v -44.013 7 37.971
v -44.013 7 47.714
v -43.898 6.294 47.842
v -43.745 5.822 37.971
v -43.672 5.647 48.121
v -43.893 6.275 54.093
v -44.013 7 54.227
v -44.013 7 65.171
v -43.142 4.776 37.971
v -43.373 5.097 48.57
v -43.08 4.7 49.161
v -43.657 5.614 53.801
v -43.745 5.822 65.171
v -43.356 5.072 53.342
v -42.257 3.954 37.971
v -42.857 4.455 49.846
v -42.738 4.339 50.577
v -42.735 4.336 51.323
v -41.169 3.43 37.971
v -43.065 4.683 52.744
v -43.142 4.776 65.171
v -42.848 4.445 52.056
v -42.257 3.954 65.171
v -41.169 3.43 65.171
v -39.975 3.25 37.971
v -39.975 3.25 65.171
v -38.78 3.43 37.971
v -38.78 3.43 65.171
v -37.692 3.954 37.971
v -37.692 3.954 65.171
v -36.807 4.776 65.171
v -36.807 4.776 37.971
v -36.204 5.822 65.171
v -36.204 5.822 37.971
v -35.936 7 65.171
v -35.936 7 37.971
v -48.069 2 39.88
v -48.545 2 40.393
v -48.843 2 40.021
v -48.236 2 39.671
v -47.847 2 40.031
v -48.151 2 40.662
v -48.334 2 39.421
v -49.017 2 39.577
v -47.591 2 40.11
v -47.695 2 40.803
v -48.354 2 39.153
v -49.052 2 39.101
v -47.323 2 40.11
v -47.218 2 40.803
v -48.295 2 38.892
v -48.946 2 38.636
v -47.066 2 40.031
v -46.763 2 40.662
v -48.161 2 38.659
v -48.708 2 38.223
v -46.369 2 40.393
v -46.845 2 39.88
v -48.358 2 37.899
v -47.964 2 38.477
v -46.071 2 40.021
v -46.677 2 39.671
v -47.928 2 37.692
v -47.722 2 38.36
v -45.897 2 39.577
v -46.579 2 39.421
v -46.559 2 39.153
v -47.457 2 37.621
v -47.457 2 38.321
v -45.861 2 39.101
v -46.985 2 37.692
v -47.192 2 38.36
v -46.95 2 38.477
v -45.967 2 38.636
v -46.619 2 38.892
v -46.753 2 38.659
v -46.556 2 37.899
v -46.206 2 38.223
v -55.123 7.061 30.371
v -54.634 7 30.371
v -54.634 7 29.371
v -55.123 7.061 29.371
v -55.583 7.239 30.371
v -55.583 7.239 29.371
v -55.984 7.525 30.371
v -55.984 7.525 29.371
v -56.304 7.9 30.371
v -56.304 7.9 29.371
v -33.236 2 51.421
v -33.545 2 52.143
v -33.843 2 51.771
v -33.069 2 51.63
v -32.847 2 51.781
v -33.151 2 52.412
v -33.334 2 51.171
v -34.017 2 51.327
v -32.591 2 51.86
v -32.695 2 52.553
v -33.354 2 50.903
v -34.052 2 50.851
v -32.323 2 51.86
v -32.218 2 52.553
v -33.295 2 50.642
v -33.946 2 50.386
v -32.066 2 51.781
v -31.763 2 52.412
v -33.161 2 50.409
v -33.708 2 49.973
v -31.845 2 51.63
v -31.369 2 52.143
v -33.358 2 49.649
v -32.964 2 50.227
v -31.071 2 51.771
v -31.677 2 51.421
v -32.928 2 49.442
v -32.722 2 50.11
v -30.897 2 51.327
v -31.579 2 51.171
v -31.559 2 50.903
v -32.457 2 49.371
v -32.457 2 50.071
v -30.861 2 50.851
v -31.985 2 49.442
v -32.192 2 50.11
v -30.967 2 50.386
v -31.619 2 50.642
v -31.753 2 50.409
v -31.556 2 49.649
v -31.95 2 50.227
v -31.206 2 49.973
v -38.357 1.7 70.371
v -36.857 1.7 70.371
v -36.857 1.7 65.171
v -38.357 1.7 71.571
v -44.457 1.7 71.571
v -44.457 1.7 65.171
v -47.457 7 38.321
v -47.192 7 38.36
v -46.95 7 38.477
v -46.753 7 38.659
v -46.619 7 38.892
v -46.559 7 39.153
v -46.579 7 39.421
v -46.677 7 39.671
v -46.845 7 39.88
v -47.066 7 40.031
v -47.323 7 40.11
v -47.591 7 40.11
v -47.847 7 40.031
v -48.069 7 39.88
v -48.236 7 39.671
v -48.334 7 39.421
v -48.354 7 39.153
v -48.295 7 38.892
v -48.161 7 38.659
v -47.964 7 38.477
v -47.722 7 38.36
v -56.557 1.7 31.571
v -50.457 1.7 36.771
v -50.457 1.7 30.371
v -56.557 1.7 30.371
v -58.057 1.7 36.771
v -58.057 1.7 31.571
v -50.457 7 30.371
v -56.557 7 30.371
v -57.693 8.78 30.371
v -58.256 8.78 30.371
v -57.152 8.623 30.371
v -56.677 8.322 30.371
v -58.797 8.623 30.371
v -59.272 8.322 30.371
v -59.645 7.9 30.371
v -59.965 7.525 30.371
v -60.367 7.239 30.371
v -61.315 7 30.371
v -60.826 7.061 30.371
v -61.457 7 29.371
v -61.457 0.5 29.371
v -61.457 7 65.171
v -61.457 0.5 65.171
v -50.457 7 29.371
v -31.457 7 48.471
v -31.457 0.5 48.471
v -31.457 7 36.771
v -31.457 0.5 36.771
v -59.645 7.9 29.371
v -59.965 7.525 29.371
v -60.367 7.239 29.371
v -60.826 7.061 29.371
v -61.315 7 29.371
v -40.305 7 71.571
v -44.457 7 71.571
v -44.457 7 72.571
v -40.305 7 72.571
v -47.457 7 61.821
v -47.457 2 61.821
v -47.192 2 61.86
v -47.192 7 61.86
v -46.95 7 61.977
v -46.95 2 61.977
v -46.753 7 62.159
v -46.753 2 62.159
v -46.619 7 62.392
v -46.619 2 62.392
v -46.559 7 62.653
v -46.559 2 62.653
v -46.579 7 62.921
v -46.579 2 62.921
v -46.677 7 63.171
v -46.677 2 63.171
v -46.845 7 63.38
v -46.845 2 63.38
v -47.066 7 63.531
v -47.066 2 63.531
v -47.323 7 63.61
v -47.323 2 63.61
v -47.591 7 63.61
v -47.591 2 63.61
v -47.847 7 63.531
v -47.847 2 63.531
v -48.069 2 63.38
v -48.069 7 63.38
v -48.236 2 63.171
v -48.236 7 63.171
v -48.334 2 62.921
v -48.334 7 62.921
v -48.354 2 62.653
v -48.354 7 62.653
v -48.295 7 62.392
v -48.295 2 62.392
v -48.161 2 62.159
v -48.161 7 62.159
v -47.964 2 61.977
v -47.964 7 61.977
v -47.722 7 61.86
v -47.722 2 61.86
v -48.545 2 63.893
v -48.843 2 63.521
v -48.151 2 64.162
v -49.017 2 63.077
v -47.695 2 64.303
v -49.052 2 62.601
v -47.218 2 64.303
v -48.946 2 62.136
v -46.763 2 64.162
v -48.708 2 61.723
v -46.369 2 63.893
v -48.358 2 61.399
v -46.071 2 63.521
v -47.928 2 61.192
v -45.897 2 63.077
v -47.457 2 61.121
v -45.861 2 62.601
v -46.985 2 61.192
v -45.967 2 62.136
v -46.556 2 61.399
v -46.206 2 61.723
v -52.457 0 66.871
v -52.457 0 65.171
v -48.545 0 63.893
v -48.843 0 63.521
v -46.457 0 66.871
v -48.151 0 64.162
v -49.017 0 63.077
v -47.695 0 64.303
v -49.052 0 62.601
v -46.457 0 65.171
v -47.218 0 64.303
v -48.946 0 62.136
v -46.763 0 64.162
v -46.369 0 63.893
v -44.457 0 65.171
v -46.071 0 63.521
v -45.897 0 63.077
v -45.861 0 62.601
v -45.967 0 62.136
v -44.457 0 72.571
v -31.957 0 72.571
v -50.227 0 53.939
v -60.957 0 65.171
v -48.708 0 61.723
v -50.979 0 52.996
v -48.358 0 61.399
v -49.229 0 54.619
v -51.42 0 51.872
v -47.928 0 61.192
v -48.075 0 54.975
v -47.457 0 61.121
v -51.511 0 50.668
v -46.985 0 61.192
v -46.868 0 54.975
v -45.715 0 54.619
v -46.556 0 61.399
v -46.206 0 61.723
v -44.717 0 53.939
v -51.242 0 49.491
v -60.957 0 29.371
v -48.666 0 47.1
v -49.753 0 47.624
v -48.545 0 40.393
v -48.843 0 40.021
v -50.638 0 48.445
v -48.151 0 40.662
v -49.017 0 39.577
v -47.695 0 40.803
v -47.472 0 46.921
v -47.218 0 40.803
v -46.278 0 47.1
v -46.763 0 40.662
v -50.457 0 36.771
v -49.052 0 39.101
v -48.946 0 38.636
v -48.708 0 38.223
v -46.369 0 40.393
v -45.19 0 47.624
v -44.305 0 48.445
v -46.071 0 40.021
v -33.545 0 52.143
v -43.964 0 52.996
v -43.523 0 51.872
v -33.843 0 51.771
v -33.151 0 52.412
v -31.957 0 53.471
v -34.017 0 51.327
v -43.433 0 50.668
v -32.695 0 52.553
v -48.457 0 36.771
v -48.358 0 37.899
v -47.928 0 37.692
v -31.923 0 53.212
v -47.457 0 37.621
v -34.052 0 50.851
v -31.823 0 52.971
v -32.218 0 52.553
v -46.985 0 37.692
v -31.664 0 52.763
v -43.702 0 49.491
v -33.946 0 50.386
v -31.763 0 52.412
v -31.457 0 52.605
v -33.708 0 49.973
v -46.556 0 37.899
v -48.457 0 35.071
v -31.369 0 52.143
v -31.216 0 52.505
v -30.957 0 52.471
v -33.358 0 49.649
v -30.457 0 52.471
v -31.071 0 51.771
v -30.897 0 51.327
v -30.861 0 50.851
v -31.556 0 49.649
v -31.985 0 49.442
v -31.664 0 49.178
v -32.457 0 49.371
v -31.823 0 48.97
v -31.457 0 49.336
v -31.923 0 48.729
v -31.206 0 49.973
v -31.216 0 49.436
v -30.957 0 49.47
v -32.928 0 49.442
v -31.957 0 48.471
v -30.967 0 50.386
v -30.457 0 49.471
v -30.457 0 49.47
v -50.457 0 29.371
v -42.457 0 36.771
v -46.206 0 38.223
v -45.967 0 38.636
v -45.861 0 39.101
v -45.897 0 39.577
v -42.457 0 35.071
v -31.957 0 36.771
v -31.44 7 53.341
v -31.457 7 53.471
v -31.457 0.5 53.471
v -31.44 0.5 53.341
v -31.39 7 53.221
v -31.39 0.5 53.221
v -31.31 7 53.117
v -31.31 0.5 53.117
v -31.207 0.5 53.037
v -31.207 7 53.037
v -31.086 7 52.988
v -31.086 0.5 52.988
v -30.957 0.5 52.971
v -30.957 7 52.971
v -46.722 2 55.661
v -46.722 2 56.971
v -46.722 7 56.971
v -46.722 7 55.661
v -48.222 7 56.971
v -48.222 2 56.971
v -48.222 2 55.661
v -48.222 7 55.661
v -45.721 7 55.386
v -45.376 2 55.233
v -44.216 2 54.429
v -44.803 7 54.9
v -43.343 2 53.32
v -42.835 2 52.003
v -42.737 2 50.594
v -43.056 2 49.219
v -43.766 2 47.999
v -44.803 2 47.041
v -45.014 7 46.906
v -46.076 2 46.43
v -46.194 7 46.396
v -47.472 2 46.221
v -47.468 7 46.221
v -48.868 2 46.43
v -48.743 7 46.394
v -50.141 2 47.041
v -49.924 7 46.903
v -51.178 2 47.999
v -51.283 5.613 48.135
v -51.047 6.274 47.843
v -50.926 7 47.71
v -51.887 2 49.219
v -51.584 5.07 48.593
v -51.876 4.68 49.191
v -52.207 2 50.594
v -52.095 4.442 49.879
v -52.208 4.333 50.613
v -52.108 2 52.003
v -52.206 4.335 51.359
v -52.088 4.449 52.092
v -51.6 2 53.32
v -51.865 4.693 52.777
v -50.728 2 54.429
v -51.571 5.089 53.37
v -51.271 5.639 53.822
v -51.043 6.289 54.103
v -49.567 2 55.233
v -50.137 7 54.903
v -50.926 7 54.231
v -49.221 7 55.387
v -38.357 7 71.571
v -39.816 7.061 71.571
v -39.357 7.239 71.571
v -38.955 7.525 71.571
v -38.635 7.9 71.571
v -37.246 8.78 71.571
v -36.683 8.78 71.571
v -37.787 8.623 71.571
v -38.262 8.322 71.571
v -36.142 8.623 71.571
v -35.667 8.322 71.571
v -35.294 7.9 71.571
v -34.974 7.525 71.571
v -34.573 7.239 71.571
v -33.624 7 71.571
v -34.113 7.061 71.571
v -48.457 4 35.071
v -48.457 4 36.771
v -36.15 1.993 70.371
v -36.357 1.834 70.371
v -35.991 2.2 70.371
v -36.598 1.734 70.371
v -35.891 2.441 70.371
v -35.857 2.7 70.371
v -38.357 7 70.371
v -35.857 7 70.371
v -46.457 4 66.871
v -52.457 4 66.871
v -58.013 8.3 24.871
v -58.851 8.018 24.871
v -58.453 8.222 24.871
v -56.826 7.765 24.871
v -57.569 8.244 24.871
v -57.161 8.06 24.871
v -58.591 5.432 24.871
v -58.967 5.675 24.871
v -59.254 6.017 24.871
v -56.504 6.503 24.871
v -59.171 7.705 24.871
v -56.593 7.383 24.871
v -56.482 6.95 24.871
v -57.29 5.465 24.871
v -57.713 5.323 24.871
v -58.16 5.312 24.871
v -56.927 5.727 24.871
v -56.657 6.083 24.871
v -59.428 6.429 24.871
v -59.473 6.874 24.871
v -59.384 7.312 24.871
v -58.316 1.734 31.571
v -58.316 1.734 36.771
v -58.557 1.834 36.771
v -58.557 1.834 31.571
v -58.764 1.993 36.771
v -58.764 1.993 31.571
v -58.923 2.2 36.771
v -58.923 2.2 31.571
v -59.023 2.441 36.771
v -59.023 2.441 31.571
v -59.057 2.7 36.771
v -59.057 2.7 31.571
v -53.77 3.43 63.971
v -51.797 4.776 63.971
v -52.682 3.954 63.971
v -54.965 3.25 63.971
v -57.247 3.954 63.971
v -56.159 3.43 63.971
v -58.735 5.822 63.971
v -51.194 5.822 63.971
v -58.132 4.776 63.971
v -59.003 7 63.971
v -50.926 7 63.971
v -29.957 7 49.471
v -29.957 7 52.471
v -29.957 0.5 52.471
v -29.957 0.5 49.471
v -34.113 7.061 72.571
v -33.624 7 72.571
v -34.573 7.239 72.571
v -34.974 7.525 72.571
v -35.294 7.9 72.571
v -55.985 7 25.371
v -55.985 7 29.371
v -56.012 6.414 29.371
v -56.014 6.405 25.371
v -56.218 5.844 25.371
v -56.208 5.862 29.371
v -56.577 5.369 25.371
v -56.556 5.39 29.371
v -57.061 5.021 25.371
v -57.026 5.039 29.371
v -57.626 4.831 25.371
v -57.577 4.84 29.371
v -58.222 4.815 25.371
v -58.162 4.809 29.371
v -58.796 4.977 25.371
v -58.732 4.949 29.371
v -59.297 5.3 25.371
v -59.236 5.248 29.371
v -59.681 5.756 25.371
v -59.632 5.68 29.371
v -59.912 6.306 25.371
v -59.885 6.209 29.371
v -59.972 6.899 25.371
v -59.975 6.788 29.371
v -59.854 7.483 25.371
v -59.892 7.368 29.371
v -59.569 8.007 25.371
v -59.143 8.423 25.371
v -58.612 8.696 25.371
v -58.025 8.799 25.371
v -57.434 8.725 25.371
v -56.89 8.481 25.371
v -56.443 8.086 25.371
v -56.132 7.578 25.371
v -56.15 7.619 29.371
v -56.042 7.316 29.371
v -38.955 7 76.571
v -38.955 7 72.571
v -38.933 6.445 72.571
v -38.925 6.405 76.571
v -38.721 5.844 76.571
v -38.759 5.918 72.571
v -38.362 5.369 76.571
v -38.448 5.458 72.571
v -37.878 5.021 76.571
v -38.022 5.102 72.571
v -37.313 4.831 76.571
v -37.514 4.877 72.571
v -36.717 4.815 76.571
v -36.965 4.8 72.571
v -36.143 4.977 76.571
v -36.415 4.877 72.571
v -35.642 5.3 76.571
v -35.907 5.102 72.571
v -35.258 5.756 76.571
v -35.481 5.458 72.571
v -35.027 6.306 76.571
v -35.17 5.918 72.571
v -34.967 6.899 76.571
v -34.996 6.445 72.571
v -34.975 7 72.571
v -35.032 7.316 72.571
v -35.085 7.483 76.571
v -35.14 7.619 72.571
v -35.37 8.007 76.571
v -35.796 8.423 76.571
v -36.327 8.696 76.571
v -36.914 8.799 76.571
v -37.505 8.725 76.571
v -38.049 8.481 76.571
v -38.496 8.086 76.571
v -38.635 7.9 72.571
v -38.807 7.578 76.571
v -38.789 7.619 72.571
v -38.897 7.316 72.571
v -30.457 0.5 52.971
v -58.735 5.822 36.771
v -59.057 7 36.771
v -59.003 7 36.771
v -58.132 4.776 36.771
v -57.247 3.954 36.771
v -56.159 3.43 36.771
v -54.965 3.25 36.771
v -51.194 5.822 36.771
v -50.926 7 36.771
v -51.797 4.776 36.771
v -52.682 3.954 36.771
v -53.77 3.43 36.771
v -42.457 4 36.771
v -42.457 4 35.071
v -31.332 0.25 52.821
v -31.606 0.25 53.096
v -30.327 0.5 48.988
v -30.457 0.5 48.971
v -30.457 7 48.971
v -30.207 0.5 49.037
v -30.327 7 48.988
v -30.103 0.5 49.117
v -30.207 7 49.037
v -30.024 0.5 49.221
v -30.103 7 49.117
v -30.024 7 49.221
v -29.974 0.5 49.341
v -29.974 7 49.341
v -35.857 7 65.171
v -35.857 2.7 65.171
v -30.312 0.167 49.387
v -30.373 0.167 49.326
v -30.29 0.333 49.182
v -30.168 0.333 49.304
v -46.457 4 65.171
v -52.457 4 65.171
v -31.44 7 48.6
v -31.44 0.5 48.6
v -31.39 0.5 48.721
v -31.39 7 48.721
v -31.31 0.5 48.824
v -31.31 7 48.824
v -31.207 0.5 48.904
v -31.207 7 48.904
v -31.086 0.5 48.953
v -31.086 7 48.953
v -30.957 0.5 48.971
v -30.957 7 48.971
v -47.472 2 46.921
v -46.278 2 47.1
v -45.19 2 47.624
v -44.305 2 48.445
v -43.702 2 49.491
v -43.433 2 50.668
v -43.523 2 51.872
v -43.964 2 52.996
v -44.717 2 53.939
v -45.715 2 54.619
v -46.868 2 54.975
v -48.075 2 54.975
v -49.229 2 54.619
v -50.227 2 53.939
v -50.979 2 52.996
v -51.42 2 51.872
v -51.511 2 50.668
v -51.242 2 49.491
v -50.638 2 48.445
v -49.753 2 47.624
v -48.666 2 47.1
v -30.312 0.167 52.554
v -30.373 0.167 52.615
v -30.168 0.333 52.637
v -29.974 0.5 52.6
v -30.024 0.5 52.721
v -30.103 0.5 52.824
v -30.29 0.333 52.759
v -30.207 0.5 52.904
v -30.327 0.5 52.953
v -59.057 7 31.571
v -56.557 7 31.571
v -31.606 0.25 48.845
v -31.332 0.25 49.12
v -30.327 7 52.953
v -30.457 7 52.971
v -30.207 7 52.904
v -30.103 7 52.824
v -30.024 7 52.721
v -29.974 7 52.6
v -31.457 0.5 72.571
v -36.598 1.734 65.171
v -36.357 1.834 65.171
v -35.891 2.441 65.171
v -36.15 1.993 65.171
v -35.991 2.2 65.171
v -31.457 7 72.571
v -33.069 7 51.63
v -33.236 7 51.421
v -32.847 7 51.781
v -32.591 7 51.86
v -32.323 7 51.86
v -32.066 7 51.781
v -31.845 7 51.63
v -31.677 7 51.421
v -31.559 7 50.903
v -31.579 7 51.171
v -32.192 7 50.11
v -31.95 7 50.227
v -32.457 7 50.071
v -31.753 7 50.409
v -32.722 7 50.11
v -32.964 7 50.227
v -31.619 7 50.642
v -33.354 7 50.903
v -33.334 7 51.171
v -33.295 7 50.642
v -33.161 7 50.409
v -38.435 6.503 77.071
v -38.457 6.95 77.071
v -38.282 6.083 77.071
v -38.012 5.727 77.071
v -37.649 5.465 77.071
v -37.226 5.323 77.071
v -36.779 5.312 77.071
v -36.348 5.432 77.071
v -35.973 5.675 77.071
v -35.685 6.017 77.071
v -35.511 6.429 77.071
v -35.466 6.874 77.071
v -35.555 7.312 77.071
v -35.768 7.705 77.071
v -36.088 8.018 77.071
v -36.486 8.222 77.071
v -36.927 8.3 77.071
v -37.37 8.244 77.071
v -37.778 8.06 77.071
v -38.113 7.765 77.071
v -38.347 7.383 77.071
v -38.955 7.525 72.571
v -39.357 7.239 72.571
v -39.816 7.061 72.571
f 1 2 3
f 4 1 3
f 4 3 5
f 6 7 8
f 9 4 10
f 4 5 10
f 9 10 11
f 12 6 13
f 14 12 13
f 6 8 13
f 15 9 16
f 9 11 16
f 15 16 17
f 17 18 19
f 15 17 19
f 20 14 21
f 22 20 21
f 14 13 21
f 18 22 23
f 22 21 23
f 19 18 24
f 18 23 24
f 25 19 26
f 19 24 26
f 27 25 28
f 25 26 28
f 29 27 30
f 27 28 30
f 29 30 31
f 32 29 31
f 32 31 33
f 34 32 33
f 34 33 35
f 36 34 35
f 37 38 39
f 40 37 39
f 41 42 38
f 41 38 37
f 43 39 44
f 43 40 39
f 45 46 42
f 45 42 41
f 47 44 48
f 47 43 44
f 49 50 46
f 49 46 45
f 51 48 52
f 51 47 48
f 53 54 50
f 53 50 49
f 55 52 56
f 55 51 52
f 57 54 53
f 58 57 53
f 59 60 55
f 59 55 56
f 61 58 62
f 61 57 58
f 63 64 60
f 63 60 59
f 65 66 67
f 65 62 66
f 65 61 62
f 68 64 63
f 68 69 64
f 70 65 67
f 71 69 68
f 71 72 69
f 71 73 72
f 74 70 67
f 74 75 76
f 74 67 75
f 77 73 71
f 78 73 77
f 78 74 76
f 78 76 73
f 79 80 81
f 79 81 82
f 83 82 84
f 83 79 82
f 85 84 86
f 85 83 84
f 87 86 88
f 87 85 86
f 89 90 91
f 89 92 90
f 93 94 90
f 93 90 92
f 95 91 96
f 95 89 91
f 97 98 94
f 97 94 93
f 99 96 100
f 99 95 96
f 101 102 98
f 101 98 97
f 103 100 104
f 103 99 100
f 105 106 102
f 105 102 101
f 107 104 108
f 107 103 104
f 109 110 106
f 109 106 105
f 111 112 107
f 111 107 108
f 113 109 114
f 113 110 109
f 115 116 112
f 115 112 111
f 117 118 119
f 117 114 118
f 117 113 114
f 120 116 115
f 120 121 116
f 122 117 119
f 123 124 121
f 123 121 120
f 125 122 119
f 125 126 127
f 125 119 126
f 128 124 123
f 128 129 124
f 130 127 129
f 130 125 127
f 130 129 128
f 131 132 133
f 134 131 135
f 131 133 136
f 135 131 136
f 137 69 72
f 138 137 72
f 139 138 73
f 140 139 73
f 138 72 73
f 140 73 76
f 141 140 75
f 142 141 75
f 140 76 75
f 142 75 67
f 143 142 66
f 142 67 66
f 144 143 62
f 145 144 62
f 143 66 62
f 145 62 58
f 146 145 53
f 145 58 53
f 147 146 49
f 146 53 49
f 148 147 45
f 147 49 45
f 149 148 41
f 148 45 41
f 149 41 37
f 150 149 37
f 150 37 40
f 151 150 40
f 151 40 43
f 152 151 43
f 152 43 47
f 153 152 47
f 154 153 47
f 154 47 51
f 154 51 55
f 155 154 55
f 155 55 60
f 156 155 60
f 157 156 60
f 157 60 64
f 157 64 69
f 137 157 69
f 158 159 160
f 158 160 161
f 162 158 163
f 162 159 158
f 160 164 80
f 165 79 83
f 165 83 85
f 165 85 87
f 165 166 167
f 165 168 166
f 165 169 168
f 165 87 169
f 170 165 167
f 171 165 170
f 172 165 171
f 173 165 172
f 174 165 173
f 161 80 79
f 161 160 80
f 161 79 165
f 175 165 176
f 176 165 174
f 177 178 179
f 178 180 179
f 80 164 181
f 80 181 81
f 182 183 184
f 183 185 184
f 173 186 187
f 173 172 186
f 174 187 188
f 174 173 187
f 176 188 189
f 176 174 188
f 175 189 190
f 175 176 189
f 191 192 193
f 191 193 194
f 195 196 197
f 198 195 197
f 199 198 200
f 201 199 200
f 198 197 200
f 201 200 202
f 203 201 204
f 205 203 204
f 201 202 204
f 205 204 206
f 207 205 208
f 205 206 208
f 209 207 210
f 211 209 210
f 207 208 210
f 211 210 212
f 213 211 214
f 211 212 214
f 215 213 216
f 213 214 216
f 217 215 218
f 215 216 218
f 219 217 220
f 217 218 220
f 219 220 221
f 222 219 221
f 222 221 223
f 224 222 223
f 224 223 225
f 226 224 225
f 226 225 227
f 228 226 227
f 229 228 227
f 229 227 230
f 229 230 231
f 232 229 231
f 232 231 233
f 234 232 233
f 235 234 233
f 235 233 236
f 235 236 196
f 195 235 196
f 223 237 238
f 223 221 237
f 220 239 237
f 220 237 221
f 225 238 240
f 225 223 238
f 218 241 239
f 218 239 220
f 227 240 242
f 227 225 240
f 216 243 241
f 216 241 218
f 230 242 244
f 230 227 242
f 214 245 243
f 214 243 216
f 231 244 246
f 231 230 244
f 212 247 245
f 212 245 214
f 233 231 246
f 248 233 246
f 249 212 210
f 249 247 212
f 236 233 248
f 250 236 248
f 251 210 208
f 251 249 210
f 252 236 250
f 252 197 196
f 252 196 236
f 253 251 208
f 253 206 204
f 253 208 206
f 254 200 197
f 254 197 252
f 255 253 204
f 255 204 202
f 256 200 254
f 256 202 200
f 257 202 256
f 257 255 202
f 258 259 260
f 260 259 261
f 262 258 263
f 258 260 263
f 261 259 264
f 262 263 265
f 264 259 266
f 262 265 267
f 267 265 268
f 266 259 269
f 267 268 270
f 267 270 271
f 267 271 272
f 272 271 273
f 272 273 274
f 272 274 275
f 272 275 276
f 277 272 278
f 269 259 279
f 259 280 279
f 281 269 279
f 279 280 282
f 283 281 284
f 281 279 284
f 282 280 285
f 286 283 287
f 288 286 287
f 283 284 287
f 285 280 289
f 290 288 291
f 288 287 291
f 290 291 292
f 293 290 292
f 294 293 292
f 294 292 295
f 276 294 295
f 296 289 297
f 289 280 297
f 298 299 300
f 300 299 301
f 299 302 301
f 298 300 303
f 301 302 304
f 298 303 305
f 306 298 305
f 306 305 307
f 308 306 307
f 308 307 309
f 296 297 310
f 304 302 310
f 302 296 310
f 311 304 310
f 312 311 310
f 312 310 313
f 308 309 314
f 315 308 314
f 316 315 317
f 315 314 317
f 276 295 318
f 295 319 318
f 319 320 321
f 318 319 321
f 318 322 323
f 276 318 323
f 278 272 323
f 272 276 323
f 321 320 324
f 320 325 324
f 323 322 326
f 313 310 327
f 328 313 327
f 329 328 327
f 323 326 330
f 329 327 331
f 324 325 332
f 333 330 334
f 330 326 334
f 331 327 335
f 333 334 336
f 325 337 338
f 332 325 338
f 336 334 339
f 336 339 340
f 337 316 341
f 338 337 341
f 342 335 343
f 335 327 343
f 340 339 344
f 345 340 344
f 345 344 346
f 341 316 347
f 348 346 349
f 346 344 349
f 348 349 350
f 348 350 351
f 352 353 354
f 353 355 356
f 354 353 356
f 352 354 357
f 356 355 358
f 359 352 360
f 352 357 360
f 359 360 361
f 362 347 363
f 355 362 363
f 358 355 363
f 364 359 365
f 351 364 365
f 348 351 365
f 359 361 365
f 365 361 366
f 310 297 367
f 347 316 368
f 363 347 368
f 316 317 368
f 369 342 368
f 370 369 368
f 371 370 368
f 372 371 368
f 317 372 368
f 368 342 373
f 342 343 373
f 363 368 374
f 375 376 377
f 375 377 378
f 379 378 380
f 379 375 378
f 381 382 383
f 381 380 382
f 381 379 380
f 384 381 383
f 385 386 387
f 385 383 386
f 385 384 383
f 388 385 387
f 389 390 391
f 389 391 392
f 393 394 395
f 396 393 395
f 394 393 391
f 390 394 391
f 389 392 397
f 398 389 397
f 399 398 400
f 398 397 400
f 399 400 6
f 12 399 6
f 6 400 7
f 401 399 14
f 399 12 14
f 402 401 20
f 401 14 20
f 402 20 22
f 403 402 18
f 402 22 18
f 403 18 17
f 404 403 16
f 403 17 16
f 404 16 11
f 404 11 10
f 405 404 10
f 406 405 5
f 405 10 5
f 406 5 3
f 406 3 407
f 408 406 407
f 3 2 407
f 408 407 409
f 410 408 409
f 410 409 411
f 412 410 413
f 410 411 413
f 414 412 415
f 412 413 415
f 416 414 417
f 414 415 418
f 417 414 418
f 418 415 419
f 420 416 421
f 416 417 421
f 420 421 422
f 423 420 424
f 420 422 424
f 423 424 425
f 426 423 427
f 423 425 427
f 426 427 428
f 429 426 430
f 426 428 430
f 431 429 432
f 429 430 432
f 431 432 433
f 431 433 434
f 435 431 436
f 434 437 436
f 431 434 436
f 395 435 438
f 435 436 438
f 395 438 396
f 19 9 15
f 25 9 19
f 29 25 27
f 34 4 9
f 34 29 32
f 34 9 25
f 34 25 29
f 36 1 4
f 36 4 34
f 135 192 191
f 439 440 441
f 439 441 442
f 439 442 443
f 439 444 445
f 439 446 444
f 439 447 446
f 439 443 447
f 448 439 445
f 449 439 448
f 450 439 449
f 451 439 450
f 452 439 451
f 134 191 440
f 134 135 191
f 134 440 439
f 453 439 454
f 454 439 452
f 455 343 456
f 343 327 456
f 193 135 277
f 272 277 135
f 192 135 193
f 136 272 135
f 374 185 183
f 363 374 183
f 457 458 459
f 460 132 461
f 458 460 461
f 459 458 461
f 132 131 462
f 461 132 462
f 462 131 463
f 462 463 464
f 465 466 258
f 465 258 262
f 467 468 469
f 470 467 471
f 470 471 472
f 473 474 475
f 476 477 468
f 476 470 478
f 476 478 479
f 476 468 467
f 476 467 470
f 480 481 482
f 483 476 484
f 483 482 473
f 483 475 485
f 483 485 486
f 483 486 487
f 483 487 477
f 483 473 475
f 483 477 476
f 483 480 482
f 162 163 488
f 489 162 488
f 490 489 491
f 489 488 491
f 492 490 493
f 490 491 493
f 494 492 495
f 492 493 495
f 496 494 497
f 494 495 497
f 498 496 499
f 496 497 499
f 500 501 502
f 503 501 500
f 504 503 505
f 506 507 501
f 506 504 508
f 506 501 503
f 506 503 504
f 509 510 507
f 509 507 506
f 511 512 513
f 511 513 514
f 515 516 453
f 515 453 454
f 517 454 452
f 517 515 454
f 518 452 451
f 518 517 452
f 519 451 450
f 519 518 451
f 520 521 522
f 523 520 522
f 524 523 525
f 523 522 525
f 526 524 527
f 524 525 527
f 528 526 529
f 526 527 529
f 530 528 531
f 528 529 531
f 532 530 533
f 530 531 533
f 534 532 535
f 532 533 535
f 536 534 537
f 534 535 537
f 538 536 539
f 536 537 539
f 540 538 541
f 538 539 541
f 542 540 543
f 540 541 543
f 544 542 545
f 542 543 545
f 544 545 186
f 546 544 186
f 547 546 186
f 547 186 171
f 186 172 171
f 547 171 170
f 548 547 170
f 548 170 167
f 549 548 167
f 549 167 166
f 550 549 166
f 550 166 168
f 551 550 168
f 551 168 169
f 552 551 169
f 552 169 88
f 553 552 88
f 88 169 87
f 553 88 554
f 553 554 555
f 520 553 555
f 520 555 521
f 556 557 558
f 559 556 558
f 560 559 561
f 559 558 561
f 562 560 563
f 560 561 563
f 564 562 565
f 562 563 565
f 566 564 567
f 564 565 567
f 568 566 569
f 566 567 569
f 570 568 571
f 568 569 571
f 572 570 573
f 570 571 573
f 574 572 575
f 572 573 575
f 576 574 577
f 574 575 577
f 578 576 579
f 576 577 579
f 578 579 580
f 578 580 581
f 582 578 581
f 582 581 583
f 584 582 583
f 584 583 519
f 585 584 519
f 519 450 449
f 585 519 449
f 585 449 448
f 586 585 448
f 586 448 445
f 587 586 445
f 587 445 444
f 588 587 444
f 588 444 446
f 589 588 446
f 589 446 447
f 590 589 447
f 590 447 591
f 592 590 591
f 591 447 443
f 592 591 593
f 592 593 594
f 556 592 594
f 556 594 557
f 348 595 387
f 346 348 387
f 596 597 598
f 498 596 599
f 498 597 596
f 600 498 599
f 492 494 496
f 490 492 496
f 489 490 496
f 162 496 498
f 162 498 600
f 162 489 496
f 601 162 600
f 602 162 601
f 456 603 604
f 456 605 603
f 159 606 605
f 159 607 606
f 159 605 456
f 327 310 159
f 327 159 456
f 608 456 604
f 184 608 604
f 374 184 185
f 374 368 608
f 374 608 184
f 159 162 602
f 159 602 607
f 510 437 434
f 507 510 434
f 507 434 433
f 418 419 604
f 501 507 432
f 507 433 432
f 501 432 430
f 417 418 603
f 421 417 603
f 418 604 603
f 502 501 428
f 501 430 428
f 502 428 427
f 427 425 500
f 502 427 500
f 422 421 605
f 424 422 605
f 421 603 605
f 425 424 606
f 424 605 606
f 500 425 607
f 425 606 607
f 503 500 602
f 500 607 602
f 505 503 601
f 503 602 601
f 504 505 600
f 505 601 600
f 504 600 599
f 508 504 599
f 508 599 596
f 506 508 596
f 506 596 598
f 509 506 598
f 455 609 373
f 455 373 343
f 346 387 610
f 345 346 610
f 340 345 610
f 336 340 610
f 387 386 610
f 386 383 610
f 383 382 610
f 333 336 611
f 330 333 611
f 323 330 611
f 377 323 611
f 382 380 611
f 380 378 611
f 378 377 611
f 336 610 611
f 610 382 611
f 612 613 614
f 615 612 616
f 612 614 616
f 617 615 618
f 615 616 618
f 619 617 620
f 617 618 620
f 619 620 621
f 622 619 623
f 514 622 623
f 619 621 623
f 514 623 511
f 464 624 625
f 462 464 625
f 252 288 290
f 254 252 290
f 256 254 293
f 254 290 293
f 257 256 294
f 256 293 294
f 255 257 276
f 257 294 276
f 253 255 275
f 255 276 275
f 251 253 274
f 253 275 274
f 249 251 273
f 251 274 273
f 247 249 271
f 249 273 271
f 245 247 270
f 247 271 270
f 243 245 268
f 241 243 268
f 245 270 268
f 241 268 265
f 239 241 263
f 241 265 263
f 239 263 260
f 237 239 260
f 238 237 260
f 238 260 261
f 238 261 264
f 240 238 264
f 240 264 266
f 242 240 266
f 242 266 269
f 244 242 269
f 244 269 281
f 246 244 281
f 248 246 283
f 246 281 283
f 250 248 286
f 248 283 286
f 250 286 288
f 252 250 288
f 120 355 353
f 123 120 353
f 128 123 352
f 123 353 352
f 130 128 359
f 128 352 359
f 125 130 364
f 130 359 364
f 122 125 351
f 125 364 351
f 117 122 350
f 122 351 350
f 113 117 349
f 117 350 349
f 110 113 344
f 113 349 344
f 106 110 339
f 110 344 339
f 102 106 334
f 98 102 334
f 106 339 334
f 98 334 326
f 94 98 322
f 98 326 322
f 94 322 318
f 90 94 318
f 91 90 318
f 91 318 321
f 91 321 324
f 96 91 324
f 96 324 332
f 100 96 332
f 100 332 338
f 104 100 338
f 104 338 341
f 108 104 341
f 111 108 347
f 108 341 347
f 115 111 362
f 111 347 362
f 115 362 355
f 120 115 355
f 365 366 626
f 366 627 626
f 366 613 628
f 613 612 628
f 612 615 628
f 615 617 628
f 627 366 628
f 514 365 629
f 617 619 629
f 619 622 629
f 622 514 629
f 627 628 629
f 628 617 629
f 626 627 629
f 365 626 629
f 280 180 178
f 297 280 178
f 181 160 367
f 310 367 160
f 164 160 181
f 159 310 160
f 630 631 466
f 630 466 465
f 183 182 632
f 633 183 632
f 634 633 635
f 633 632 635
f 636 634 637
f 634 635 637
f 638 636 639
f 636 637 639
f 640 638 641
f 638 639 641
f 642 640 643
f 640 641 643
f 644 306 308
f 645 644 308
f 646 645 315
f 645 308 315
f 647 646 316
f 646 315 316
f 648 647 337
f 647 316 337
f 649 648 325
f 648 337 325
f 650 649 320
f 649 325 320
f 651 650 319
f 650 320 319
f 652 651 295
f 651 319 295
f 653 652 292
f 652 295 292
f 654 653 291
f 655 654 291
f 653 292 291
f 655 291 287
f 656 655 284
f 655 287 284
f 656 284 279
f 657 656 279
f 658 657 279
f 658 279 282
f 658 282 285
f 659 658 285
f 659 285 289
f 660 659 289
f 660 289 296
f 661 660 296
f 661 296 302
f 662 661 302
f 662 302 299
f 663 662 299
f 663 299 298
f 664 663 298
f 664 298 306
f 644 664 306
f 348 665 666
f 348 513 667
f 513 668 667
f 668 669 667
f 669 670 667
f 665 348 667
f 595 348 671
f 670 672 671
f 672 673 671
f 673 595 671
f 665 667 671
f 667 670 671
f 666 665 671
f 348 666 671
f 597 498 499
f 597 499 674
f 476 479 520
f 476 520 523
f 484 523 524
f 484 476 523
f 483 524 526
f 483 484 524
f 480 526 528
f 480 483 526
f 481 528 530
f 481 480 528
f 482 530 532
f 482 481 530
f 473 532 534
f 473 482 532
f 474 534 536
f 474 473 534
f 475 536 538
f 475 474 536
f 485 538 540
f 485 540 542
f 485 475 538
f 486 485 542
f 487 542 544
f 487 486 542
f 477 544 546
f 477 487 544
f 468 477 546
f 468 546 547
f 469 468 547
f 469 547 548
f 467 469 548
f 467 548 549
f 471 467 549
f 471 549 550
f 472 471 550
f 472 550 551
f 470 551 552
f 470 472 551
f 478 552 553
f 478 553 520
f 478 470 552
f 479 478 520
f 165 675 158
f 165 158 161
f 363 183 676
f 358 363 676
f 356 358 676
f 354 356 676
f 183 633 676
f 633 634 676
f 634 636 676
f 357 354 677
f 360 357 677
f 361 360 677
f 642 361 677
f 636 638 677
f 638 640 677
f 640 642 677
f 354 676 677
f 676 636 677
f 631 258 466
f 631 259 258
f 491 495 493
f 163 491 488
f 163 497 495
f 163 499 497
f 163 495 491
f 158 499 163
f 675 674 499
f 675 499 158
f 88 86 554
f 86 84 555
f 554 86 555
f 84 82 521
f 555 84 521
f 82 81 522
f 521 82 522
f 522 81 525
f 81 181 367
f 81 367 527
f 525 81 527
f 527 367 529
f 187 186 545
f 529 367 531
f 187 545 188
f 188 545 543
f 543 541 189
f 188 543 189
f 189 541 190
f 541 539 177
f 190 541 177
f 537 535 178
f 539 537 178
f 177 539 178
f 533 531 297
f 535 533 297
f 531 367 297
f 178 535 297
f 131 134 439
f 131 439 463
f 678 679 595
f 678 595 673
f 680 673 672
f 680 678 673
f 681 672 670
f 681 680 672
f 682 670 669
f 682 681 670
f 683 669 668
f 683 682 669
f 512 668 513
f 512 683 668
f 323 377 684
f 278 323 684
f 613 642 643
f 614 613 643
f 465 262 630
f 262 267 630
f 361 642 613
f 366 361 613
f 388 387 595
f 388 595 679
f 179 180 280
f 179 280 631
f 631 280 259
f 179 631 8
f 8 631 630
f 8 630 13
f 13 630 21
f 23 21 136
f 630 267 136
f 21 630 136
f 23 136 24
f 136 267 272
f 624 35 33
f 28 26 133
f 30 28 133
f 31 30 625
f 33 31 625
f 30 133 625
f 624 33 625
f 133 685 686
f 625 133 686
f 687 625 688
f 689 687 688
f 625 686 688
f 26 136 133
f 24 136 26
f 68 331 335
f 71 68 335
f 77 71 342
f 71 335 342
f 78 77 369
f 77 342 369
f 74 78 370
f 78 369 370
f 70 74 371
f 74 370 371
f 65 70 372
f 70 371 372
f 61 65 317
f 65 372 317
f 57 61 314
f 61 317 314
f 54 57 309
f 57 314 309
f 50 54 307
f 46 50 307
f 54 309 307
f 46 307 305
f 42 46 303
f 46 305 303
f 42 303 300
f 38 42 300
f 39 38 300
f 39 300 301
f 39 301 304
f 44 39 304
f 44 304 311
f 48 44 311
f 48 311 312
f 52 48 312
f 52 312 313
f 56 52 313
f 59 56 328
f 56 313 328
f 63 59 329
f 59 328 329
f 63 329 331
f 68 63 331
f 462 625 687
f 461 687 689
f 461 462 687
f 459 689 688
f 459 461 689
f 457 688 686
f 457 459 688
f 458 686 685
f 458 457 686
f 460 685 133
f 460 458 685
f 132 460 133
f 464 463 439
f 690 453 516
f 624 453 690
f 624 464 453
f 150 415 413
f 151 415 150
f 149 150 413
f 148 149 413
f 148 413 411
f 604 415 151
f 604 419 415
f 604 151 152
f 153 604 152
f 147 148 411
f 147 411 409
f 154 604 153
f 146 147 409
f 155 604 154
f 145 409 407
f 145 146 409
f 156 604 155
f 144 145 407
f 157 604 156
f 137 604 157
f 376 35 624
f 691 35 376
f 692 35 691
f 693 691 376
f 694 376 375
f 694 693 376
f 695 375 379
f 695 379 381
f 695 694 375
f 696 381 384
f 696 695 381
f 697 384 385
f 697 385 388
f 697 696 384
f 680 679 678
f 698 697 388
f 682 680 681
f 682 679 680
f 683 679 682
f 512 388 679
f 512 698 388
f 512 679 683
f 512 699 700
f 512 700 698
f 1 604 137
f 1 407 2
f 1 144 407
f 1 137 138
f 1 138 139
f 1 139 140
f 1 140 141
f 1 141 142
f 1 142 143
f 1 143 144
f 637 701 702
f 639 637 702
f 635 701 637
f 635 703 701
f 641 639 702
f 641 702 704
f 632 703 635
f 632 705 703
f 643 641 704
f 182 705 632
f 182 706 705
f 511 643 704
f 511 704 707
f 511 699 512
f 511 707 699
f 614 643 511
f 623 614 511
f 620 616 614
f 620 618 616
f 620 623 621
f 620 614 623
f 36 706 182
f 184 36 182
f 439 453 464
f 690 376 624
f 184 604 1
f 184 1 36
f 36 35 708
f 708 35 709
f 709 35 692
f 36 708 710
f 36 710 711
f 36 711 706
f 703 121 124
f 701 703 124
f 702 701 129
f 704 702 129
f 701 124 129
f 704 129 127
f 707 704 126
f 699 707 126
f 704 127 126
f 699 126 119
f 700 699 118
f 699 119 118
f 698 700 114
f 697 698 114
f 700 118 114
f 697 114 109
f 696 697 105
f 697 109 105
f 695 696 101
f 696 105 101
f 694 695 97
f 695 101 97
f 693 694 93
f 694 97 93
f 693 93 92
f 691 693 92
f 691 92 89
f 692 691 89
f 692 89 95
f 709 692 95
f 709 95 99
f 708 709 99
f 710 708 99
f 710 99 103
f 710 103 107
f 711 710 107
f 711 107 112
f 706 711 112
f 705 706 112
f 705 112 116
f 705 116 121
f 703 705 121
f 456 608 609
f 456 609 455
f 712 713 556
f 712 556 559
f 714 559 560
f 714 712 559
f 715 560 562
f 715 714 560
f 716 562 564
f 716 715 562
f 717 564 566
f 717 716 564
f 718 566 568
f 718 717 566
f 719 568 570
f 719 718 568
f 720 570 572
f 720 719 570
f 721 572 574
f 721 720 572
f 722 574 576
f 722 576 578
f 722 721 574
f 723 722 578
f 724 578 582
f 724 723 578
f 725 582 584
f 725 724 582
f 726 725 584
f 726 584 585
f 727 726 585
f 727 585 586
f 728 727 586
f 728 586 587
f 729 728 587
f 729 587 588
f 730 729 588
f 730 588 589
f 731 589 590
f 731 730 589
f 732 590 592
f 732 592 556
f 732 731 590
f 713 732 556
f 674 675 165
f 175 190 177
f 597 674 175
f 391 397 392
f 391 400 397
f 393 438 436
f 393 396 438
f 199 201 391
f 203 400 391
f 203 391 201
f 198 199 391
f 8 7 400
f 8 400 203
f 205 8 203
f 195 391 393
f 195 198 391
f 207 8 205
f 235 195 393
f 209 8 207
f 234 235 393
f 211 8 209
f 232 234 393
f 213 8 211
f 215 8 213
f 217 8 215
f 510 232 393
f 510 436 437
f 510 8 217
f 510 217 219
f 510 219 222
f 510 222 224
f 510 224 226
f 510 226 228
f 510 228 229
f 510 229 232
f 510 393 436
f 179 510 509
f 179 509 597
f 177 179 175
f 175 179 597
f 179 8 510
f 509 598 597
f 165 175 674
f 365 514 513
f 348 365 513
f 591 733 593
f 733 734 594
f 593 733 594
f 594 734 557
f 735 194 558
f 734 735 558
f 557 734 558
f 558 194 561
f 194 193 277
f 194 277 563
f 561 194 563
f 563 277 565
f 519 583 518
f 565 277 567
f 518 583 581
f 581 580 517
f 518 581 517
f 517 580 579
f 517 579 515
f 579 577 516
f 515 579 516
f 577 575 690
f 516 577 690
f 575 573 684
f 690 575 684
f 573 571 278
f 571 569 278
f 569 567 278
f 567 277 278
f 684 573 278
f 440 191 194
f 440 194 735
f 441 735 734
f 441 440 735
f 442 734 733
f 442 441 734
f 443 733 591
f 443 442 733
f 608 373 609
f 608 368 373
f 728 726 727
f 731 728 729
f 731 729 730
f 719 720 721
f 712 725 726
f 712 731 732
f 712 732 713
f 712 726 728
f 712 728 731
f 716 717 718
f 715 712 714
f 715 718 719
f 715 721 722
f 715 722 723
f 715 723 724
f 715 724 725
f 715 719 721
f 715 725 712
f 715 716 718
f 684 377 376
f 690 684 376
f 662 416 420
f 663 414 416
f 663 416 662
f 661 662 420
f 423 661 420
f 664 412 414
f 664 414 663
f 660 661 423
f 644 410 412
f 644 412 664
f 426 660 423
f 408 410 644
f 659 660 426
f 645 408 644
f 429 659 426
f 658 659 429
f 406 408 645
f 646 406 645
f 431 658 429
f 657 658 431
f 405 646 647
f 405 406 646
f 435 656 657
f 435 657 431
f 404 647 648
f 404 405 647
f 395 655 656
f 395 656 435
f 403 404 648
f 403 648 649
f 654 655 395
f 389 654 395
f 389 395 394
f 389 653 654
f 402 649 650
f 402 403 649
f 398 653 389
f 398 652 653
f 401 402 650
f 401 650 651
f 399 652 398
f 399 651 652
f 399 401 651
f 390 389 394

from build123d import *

# Parameters (mm, degrees)
SKETCH1_W            = 30
SKETCH1_H            = 30.8
BOSS_EXTRUDE1_DEPTH  = 7
SKETCH2_R            = 4.05
CUT_EXTRUDE1_DEPTH   = 6.5
SKETCH3_W            = 15
SKETCH3_H            = 1.2
SKETCH3_W_2          = 9
SKETCH3_W_3          = 11
SKETCH3_W_4          = 13
CUT_EXTRUDE2_DEPTH   = 4
SKETCH4_W            = 30
SKETCH4_H            = 3
CUT_EXTRUDE3_DEPTH   = 1.2
SKETCH5_W            = 30
SKETCH5_H            = 3
CUT_EXTRUDE4_DEPTH   = 1.2
SKETCH6_R            = 4.05
CUT_EXTRUDE5_DEPTH   = 27.2
SKETCH7_R            = 4.05
CUT_EXTRUDE6_DEPTH   = 27.2
SKETCH8_R            = 4.75
CUT_EXTRUDE7_DEPTH   = 5
BOSS_EXTRUDE2_DEPTH  = 6.4
FILLET1_R            = 1
BOSS_EXTRUDE3_DEPTH  = 6.4
FILLET2_R            = 1
SKETCH12_W           = 1.5
SKETCH12_H           = 1.344099237
CUT_EXTRUDE8_DEPTH   = 5
SKETCH13_W           = 13
SKETCH13_H           = 7
BOSS_EXTRUDE4_DEPTH  = 1
SKETCH14_W           = 11
SKETCH14_H           = 7
BOSS_EXTRUDE5_DEPTH  = 1
SKETCH15_R           = 2
BOSS_EXTRUDE8_DEPTH  = 5.5
SKETCH16_R           = 2
BOSS_EXTRUDE9_DEPTH  = 5.5
FILLET3_R            = 2
FILLET4_R            = 2
FILLET5_R            = 2
CHAMFER2_SIZE        = 0.5
CHAMFER3_SIZE        = 0.5
SKETCH17_W           = 4
SKETCH17_H           = 7
BOSS_EXTRUDE10_DEPTH = 1.5
FILLET7_R            = 0.5
SKETCH18_R           = 0.9
CUT_EXTRUDE9_DEPTH   = 99.965895754
SKETCH19_R           = 1.6
CUT_EXTRUDE10_DEPTH  = 2
SKETCH20_R           = 0.9
CUT_EXTRUDE11_DEPTH  = 99.965895754
SKETCH21_R           = 1.6
CUT_EXTRUDE12_DEPTH  = 2
CHAMFER6_SIZE        = 0.5
SKETCH22_W           = 6
SKETCH22_H           = 4
BOSS_EXTRUDE11_DEPTH = 0.5
SKETCH23_W           = 6
SKETCH23_H           = 4
BOSS_EXTRUDE12_DEPTH = 0.5
BOSS_EXTRUDE13_REACH = 100.822
SKETCH24_W           = 4.732966807
SKETCH24_H           = 1.2
SKETCH24_W_2         = 4.75835454


# Some blends are built 0.0001 mm under size
with BuildPart() as part:
    # Sketch1 → Boss-Extrude1 (new body)
    with BuildSketch(Plane(origin=(0, 0, 0), x_dir=(1, 0, 0), z_dir=(0, 1, 0))):
        with Locations((-46.45686042, -50.970505576)):
            Rectangle(SKETCH1_W, SKETCH1_H)
    extrude(amount=BOSS_EXTRUDE1_DEPTH)

    # Sketch2 → Cut-Extrude1 (cut)
    with BuildSketch(Plane.XZ):
        with Locations(Location((-47.47186042, 50.970505576, 0), (0, 0, 270))):
            Circle(SKETCH2_R)
    extrude(amount=-CUT_EXTRUDE1_DEPTH, mode=Mode.SUBTRACT)

    # Sketch3 → Cut-Extrude2 (cut)
    with BuildSketch(Plane.XZ):
        with Locations((-38.95686042, 65.770505576)):
            Rectangle(SKETCH3_W, SKETCH3_H)
        with Locations((-56.95686042, 65.770505576)):
            Rectangle(SKETCH3_W_2, SKETCH3_H)
        with Locations((-36.95686042, 36.170505576)):
            Rectangle(SKETCH3_W_3, SKETCH3_H)
        with Locations((-54.95686042, 36.170505576)):
            Rectangle(SKETCH3_W_4, SKETCH3_H)
    extrude(amount=-CUT_EXTRUDE2_DEPTH, mode=Mode.SUBTRACT)

    # Sketch4 → Cut-Extrude3 (cut)
    with BuildSketch(Plane.XY.offset(66.370505576)):
        with Locations((-46.45686042, 5.5)):
            Rectangle(SKETCH4_W, SKETCH4_H)
    extrude(amount=-CUT_EXTRUDE3_DEPTH, mode=Mode.SUBTRACT)

    # Sketch5 → Cut-Extrude4 (cut)
    with BuildSketch(Plane(origin=(0, 0, 35.570505576), x_dir=(-1, 0, 0), z_dir=(0, 0, -1))):
        with Locations((46.45686042, 5.5)):
            Rectangle(SKETCH5_W, SKETCH5_H)
    extrude(amount=-CUT_EXTRUDE4_DEPTH, mode=Mode.SUBTRACT)

    # Sketch6 → Cut-Extrude5 (cut)
    with BuildSketch(Plane.XY.offset(65.170505576)):
        with Locations((-39.974556342, 7.3)):
            Circle(SKETCH6_R)
    extrude(amount=-CUT_EXTRUDE5_DEPTH, mode=Mode.SUBTRACT)

    # Sketch7 → Cut-Extrude6 (cut)
    with BuildSketch(Plane(origin=(0, 0, 36.770505576), x_dir=(-1, 0, 0), z_dir=(0, 0, -1))):
        with Locations((54.96455223, 7.3)):
            Circle(SKETCH7_R)
    extrude(amount=-CUT_EXTRUDE6_DEPTH, mode=Mode.SUBTRACT)

    # Sketch8 → Cut-Extrude7 (cut)
    with BuildSketch(Plane(origin=(0, 7, 0), x_dir=(1, 0, 0), z_dir=(0, 1, 0))):
        with Locations(Location((-47.47186042, -50.970505576, 0), (0, 0, 270))):
            Circle(SKETCH8_R)
    extrude(amount=-CUT_EXTRUDE7_DEPTH, mode=Mode.SUBTRACT)

    # Sketch10 → Boss-Extrude2 (add)
    with BuildSketch(Plane.XY.offset(65.170505576)):
        Polygon((-31.45686042, 0), (-31.45686042, 7), (-35.85686042, 7), (-35.85686042, 1.7), (-44.45686042, 1.7), (-44.45686042, 0), align=None)
    extrude(amount=BOSS_EXTRUDE2_DEPTH)

    # Fillet1
    fillet1_edges = [part.edges().sort_by_distance(p)[0] for p in [
        (-35.85686042, 1.7, 68.370505576),
    ]]
    fillet(fillet1_edges, radius=FILLET1_R)

    # Sketch11 → Boss-Extrude3 (add)
    with BuildSketch(Plane(origin=(0, 0, 36.770505576), x_dir=(-1, 0, 0), z_dir=(0, 0, -1))):
        Polygon((61.45686042, 7), (61.45686042, 0), (50.45686042, 0), (50.45686042, 1.7), (59.05686042, 1.7), (59.05686042, 7), align=None)
    extrude(amount=BOSS_EXTRUDE3_DEPTH)

    # Fillet2
    fillet2_edges = [part.edges().sort_by_distance(p)[0] for p in [
        (-59.05686042, 1.7, 33.570505576),
    ]]
    fillet(fillet2_edges, radius=FILLET2_R)

    # Sketch12 → Cut-Extrude8 (cut)
    with BuildSketch(Plane(origin=(0, 7, 0), x_dir=(1, 0, 0), z_dir=(0, 1, 0))):
        with Locations((-47.47186042, -56.298455958)):
            Rectangle(SKETCH12_W, SKETCH12_H)
    extrude(amount=-CUT_EXTRUDE8_DEPTH, mode=Mode.SUBTRACT)

    # Sketch13 → Boss-Extrude4 (add)
    with BuildSketch(Plane.XY.offset(71.570505576)):
        with Locations((-37.95686042, 3.5)):
            Rectangle(SKETCH13_W, SKETCH13_H)
    extrude(amount=BOSS_EXTRUDE4_DEPTH)

    # Sketch14 → Boss-Extrude5 (add)
    with BuildSketch(Plane(origin=(0, 0, 30.370505576), x_dir=(-1, 0, 0), z_dir=(0, 0, -1))):
        with Locations((55.95686042, 3.5)):
            Rectangle(SKETCH14_W, SKETCH14_H)
    extrude(amount=BOSS_EXTRUDE5_DEPTH)

    # Sketch15 → Boss-Extrude8 (add)
    with BuildSketch(Plane.XY.offset(71.570505576)):
        with Locations(Location((-36.96455223, 6.8, 0), (0, 0, 174.260829523))):
            Circle(SKETCH15_R)
    extrude(amount=BOSS_EXTRUDE8_DEPTH)

    # Sketch16 → Boss-Extrude9 (add)
    with BuildSketch(Plane(origin=(0, 0, 30.370505576), x_dir=(-1, 0, 0), z_dir=(0, 0, -1))):
        with Locations(Location((57.974556342, 6.8, 0), (0, 0, 174.260829523))):
            Circle(SKETCH16_R)
    extrude(amount=BOSS_EXTRUDE9_DEPTH)

    # Fillet3
    fillet3_edges = [part.edges().sort_by_distance(p)[0] for p in [
        (-59.964531217, 7, 29.870505576),
    ]]
    fillet(fillet3_edges, radius=FILLET3_R)

    # Fillet4
    # the kernel refuses this fillet: 2 mm, written as the material it adds along each edge
    with BuildSketch(Plane(origin=(-55.984581468, 7, 30.370505576), x_dir=(1.0, 7.52728269616064e-12, 0), z_dir=(0, 0, -1))) as fillet4_piece_1:
        with BuildLine():
            CenterArc((1.350683743, -2), FILLET4_R, 90, 56.632987031)
            ThreePointArc((-0.319645565, -0.9), (-0.105311329, -0.469360383), (0, 0))
            Line((0, 0), (1.350683743, 0))
        make_face()
    extrude(amount=1)

    # Fillet5
    # the kernel refuses this fillet: 2 mm, written as the material it adds along each edge
    with BuildSketch(Plane(origin=(-38.954527104, 7, 71.570505576), x_dir=(-1.0, 7.116297137925098e-12, 0), z_dir=(0, 0, 1)), Plane(origin=(-34.974577356, 7, 72.570505576), x_dir=(1, 0, 0), z_dir=(0, 0, -1))) as fillet5_piece_1:
        with BuildLine():
            CenterArc((1.350683743, -2), FILLET5_R, 90, 56.632987031)
            ThreePointArc((-0.319645565, -0.9), (-0.105311329, -0.469360383), (0, 0))
            Line((0, 0), (1.350683743, 0))
        make_face()
    extrude(amount=1)

    # Chamfer2
    chamfer2_edges = [part.edges().sort_by_distance(p)[0] for p in [
        (-34.974577356, 6.6, 77.070505576),
    ]]
    chamfer(chamfer2_edges, length=CHAMFER2_SIZE)

    # Chamfer3
    chamfer3_edges = [part.edges().sort_by_distance(p)[0] for p in [
        (-59.964531217, 6.6, 24.870505576),
    ]]
    chamfer(chamfer3_edges, length=CHAMFER3_SIZE)

    # Sketch17 → Boss-Extrude10 (add)
    with BuildSketch(Plane(origin=(-31.45686042, 0, 0), x_dir=(0, 0, -1), z_dir=(1, 0, 0))):
        with Locations((-50.970505576, 3.5)):
            Rectangle(SKETCH17_W, SKETCH17_H)
    extrude(amount=BOSS_EXTRUDE10_DEPTH)

    # Fillet7
    fillet7_edges = [part.edges().sort_by_distance(p)[0] for p in [
        (-31.45686042, 3.5, 52.970505576),
        (-31.45686042, 3.5, 48.970505576),
        (-29.95686042, 3.5, 52.970505576),
        (-29.95686042, 3.5, 48.970505576),
    ]]
    fillet(fillet7_edges, radius=FILLET7_R)

    # Sketch18 → Cut-Extrude9 (cut, through all)
    with BuildSketch(Plane.XZ):
        with Locations(Location((-32.45686042, 50.970505576, 0), (0, 0, 270))):
            Circle(SKETCH18_R)
    extrude(amount=-CUT_EXTRUDE9_DEPTH, mode=Mode.SUBTRACT)

    # Sketch19 → Cut-Extrude10 (cut)
    with BuildSketch(Plane.XZ):
        with Locations(Location((-32.45686042, 50.970505576, 0), (0, 0, 270))):
            Circle(SKETCH19_R)
    extrude(amount=-CUT_EXTRUDE10_DEPTH, mode=Mode.SUBTRACT)

    # Sketch20 → Cut-Extrude11 (cut, through all)
    with BuildSketch(Plane.XZ):
        with Locations(Location((-47.45686042, 62.720505576, 0), (0, 0, 270))):
            Circle(SKETCH20_R)
        with Locations(Location((-47.45686042, 39.220505576, 0), (0, 0, 270))):
            Circle(SKETCH20_R)
    extrude(amount=-CUT_EXTRUDE11_DEPTH, mode=Mode.SUBTRACT)

    # Sketch21 → Cut-Extrude12 (cut)
    with BuildSketch(Plane.XZ):
        with Locations(Location((-47.45686042, 62.720505576, 0), (0, 0, 270))):
            Circle(SKETCH21_R)
        with Locations(Location((-47.45686042, 39.220505576, 0), (0, 0, 270))):
            Circle(SKETCH21_R)
    extrude(amount=-CUT_EXTRUDE12_DEPTH, mode=Mode.SUBTRACT)

    # Chamfer6
    chamfer6_edges = [part.edges().sort_by_distance(p)[0] for p in [
        (-61.45686042, 0, 47.270505576),
        (-31.45686042, 0, 63.020505576),
        (-30.70686042, 0, 52.970505576),
        (-29.95686042, 0, 50.970505576),
        (-31.45686042, 0, 42.620505576),
        (-30.70686042, 0, 48.970505576),
        (-30.103307029, 0, 49.116952185),
        (-30.103307029, 0, 52.824058967),
        (-31.310413811, 0, 53.116952185),
        (-31.310413811, 0, 48.824058967),
    ]]
    chamfer(chamfer6_edges, length=CHAMFER6_SIZE - 0.0001)  # a hair under: the kernel refuses the full size

    # Sketch22 → Boss-Extrude11 (add)
    with BuildSketch(Plane(origin=(0, 0, 35.570505576), x_dir=(-1, 0, 0), z_dir=(0, 0, -1))):
        with Locations((45.45686042, 2)):
            Rectangle(SKETCH22_W, SKETCH22_H)
    extrude(amount=BOSS_EXTRUDE11_DEPTH)

    # Sketch23 → Boss-Extrude12 (add)
    with BuildSketch(Plane.XY.offset(66.370505576)):
        with Locations((-49.45686042, 2)):
            Rectangle(SKETCH23_W, SKETCH23_H)
    extrude(amount=BOSS_EXTRUDE12_DEPTH)

    # Boss-Extrude13: up to this face of the body (flat: up to its plane)
    boss_extrude13_end = Plane(part.part.faces().sort_by_distance((-54.25686042, 1.7, 33.570505576))[0])
    # Sketch24 → Boss-Extrude13 (add, up to the picked face)
    with BuildSketch(Plane(origin=(0, 7, 0), x_dir=(1, 0, 0), z_dir=(0, 1, 0)), mode=Mode.PRIVATE) as boss_extrude13_sk1:
        with Locations((-35.990377017, -70.970505576)):
            Rectangle(SKETCH24_W, SKETCH24_H)
    boss_extrude13_tool1 = split(extrude(boss_extrude13_sk1.sketch, amount=-BOSS_EXTRUDE13_REACH, mode=Mode.PRIVATE), bisect_by=boss_extrude13_end, keep=Keep.BOTH, mode=Mode.PRIVATE)
    # Sketch24 → Boss-Extrude13 (add, up to the picked face)
    with BuildSketch(Plane(origin=(0, 7, 0), x_dir=(1, 0, 0), z_dir=(0, 1, 0)), mode=Mode.PRIVATE) as boss_extrude13_sk2:
        with Locations((-58.93603769, -30.970505576)):
            Rectangle(SKETCH24_W_2, SKETCH24_H)
    boss_extrude13_tool2 = split(extrude(boss_extrude13_sk2.sketch, amount=-BOSS_EXTRUDE13_REACH, mode=Mode.PRIVATE), bisect_by=boss_extrude13_end, keep=Keep.BOTH, mode=Mode.PRIVATE)
    add(boss_extrude13_tool1.solids().sort_by(Axis((-35.990377, 7, 70.970506), (0, -1, 0)))[0])
    add(boss_extrude13_tool2.solids().sort_by(Axis((-58.936038, 7, 30.970506), (0, -1, 0)))[0])


solid = part.part
